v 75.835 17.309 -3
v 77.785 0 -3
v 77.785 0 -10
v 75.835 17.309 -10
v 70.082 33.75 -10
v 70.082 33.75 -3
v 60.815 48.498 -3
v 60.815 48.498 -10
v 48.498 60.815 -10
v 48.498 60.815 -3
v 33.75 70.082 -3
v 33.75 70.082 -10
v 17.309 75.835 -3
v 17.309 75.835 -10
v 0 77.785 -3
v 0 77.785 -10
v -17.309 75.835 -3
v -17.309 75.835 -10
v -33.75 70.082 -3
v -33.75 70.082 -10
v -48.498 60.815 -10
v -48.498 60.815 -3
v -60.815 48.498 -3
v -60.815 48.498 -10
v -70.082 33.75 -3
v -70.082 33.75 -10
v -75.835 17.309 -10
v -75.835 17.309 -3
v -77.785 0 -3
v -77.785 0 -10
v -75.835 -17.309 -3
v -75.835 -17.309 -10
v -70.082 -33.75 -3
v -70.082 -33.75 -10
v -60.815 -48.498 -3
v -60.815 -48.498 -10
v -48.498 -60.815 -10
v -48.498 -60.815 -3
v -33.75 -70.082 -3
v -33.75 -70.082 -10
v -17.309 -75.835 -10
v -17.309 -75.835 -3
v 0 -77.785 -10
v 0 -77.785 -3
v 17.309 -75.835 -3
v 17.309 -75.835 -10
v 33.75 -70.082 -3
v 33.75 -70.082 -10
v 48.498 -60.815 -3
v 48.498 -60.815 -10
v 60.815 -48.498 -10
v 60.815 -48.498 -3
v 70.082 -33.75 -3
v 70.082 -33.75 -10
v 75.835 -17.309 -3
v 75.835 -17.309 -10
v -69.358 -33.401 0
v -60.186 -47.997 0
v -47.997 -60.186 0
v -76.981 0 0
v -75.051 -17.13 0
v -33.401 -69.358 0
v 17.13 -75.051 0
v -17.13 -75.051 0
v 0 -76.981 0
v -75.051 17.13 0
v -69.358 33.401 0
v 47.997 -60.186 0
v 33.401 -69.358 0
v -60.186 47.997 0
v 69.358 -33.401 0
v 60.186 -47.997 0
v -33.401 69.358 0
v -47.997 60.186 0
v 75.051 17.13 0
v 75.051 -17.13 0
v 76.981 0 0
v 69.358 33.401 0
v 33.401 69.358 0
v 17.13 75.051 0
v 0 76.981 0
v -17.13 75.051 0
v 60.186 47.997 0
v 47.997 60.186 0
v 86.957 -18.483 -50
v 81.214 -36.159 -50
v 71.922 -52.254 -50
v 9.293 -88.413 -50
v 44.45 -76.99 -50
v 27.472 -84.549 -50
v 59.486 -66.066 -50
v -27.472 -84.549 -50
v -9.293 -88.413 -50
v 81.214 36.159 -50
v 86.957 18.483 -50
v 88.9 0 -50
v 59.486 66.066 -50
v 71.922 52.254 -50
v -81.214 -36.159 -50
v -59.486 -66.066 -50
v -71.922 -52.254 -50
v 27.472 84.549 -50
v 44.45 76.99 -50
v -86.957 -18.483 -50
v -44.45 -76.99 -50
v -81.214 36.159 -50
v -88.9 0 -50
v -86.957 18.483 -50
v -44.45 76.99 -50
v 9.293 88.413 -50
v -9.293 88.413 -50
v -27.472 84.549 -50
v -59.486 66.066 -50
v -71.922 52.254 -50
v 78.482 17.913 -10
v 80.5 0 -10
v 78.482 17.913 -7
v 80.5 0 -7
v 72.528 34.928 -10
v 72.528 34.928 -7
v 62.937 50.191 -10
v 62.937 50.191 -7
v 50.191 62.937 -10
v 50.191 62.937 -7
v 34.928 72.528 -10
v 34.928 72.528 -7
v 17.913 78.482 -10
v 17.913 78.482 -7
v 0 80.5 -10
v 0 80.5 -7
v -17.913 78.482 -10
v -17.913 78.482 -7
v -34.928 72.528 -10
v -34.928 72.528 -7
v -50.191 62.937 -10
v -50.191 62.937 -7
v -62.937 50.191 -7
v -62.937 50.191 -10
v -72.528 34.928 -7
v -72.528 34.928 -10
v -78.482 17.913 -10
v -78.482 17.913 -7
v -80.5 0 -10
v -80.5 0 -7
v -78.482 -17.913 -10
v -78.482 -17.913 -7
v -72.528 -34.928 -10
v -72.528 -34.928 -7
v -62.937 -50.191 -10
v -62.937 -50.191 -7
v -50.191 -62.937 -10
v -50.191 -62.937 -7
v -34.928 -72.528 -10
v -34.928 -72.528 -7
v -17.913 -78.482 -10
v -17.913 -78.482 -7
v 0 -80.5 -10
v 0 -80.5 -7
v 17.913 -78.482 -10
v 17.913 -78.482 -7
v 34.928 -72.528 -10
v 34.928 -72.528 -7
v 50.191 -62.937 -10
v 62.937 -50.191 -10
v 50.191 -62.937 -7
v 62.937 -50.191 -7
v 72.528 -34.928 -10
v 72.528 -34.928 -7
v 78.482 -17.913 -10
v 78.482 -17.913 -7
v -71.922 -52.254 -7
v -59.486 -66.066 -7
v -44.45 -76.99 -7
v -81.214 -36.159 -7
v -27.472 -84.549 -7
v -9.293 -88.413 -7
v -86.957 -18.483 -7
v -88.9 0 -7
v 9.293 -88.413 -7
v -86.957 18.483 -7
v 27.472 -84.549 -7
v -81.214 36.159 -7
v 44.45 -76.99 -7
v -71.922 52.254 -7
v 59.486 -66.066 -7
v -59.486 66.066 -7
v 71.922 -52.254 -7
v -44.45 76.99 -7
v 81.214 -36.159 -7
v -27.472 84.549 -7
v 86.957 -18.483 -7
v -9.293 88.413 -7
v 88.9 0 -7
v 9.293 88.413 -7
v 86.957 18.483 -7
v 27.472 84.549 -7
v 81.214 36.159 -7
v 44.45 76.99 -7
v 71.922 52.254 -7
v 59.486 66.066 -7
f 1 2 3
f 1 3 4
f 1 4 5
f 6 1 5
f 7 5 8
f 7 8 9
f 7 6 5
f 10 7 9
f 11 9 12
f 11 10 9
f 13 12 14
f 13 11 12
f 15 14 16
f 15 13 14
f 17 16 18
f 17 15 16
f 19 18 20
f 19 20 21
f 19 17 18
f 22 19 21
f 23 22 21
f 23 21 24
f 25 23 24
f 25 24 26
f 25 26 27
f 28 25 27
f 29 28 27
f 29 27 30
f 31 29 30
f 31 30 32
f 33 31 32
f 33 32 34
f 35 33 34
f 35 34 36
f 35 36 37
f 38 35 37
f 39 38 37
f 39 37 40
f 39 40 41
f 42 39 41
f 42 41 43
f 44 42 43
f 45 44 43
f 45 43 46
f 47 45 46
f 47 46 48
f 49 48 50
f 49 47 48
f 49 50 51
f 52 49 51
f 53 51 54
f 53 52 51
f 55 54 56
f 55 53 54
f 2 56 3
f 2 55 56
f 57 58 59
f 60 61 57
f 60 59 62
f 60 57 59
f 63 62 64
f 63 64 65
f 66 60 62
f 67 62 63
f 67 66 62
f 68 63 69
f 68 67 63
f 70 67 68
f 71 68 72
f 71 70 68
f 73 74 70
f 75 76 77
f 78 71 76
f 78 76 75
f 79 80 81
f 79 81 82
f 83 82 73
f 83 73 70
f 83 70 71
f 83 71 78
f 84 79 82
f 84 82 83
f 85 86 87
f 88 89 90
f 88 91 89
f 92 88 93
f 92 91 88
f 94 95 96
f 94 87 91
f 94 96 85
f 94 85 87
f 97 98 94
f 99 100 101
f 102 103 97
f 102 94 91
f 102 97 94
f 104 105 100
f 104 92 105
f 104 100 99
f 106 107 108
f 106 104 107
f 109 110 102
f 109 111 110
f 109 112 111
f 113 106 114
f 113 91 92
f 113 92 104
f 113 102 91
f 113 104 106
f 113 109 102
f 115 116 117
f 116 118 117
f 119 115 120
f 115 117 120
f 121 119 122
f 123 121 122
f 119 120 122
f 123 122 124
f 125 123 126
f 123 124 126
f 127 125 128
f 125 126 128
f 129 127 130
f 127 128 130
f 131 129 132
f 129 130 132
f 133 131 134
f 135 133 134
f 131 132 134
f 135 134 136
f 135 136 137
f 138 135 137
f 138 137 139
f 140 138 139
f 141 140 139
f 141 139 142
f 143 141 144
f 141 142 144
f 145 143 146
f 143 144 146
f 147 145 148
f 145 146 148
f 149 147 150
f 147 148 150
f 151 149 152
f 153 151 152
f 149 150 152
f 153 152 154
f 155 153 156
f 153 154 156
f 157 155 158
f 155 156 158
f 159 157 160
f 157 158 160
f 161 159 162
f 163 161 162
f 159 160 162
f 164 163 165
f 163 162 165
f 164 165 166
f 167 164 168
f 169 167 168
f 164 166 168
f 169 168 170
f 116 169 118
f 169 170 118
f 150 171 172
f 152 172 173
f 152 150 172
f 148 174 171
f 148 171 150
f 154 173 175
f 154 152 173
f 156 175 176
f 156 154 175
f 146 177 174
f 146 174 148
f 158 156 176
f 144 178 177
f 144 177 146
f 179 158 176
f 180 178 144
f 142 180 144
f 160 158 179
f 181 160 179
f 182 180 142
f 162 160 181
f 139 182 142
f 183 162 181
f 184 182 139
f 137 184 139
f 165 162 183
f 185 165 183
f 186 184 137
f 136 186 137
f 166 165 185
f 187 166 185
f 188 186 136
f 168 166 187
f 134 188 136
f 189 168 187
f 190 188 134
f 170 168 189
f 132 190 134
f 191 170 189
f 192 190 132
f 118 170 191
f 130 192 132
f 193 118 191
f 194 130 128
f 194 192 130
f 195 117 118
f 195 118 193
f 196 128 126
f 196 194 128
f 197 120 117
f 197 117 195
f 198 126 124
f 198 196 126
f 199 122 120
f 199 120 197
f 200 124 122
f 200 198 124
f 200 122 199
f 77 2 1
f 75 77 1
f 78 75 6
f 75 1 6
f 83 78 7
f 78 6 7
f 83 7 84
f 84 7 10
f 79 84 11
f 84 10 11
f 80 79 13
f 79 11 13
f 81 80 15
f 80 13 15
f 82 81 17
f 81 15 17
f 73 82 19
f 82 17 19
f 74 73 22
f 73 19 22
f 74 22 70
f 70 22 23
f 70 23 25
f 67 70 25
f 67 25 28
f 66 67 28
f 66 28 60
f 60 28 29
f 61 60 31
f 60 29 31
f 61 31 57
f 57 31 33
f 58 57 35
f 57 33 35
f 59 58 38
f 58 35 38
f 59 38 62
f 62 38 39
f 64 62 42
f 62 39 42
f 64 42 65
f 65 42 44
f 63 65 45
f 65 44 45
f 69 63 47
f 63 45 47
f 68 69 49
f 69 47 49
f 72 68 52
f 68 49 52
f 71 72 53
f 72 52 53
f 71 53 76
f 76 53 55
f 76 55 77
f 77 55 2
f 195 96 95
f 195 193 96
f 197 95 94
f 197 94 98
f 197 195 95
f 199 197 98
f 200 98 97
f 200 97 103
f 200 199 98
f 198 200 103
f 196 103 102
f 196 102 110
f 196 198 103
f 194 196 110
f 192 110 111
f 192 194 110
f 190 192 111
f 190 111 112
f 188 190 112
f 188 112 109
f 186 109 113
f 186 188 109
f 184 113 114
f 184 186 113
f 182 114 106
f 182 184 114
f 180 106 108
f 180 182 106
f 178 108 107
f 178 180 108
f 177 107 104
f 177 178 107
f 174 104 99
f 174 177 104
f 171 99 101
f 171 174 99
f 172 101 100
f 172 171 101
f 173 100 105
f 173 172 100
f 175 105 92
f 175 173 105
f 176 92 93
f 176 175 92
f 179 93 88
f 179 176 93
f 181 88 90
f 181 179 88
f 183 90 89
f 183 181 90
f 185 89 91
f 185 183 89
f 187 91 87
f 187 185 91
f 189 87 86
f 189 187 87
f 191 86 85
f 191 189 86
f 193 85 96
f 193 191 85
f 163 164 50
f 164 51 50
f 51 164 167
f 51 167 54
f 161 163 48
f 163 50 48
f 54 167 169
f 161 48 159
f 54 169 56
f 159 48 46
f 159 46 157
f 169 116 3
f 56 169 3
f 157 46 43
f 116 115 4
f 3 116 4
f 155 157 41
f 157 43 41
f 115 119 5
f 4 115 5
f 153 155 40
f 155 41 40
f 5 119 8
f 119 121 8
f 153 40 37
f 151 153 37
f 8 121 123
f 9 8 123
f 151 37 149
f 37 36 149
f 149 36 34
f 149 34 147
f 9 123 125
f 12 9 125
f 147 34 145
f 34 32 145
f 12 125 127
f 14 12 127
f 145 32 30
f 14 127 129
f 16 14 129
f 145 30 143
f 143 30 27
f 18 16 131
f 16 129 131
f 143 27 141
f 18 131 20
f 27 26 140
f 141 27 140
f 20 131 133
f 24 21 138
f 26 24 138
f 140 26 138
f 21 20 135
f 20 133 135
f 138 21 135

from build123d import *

# Parameters (mm, degrees)
F2_SIZE2 = 3
F2_SIZE  = 0.8038475773
F3_W     = 2.715
F3_H     = 3


with BuildPart() as f1:
    # F0 (on Front) → F1 (revolve)
    with BuildSketch(Plane.XZ):
        Polygon((77.785, 0), (0, 0), (0, -50), (88.9, -50), (88.9, -7), (77.785, -7), align=None)
    revolve(axis=Axis((0, 0, -25), (0, 0, 1)))

    # F2
    f2_edges = [f1.edges().sort_by_distance(p)[0] for p in [
        (-77.785, 0, 0),
    ]]
    f2_side = f1.faces().sort_by_distance((0, 0, 0))[0]
    chamfer(f2_edges, length=F2_SIZE, length2=F2_SIZE2, reference=f2_side)

    # F3 (on Front) → F4 (revolve, cut)
    with BuildSketch(Plane.XZ):
        with Locations((79.1425, -8.5)):
            Rectangle(F3_W, F3_H)
    revolve(axis=Axis((0, 0, -8.4670595825), (0, 0, 1)), mode=Mode.SUBTRACT)


solid = f1.part
